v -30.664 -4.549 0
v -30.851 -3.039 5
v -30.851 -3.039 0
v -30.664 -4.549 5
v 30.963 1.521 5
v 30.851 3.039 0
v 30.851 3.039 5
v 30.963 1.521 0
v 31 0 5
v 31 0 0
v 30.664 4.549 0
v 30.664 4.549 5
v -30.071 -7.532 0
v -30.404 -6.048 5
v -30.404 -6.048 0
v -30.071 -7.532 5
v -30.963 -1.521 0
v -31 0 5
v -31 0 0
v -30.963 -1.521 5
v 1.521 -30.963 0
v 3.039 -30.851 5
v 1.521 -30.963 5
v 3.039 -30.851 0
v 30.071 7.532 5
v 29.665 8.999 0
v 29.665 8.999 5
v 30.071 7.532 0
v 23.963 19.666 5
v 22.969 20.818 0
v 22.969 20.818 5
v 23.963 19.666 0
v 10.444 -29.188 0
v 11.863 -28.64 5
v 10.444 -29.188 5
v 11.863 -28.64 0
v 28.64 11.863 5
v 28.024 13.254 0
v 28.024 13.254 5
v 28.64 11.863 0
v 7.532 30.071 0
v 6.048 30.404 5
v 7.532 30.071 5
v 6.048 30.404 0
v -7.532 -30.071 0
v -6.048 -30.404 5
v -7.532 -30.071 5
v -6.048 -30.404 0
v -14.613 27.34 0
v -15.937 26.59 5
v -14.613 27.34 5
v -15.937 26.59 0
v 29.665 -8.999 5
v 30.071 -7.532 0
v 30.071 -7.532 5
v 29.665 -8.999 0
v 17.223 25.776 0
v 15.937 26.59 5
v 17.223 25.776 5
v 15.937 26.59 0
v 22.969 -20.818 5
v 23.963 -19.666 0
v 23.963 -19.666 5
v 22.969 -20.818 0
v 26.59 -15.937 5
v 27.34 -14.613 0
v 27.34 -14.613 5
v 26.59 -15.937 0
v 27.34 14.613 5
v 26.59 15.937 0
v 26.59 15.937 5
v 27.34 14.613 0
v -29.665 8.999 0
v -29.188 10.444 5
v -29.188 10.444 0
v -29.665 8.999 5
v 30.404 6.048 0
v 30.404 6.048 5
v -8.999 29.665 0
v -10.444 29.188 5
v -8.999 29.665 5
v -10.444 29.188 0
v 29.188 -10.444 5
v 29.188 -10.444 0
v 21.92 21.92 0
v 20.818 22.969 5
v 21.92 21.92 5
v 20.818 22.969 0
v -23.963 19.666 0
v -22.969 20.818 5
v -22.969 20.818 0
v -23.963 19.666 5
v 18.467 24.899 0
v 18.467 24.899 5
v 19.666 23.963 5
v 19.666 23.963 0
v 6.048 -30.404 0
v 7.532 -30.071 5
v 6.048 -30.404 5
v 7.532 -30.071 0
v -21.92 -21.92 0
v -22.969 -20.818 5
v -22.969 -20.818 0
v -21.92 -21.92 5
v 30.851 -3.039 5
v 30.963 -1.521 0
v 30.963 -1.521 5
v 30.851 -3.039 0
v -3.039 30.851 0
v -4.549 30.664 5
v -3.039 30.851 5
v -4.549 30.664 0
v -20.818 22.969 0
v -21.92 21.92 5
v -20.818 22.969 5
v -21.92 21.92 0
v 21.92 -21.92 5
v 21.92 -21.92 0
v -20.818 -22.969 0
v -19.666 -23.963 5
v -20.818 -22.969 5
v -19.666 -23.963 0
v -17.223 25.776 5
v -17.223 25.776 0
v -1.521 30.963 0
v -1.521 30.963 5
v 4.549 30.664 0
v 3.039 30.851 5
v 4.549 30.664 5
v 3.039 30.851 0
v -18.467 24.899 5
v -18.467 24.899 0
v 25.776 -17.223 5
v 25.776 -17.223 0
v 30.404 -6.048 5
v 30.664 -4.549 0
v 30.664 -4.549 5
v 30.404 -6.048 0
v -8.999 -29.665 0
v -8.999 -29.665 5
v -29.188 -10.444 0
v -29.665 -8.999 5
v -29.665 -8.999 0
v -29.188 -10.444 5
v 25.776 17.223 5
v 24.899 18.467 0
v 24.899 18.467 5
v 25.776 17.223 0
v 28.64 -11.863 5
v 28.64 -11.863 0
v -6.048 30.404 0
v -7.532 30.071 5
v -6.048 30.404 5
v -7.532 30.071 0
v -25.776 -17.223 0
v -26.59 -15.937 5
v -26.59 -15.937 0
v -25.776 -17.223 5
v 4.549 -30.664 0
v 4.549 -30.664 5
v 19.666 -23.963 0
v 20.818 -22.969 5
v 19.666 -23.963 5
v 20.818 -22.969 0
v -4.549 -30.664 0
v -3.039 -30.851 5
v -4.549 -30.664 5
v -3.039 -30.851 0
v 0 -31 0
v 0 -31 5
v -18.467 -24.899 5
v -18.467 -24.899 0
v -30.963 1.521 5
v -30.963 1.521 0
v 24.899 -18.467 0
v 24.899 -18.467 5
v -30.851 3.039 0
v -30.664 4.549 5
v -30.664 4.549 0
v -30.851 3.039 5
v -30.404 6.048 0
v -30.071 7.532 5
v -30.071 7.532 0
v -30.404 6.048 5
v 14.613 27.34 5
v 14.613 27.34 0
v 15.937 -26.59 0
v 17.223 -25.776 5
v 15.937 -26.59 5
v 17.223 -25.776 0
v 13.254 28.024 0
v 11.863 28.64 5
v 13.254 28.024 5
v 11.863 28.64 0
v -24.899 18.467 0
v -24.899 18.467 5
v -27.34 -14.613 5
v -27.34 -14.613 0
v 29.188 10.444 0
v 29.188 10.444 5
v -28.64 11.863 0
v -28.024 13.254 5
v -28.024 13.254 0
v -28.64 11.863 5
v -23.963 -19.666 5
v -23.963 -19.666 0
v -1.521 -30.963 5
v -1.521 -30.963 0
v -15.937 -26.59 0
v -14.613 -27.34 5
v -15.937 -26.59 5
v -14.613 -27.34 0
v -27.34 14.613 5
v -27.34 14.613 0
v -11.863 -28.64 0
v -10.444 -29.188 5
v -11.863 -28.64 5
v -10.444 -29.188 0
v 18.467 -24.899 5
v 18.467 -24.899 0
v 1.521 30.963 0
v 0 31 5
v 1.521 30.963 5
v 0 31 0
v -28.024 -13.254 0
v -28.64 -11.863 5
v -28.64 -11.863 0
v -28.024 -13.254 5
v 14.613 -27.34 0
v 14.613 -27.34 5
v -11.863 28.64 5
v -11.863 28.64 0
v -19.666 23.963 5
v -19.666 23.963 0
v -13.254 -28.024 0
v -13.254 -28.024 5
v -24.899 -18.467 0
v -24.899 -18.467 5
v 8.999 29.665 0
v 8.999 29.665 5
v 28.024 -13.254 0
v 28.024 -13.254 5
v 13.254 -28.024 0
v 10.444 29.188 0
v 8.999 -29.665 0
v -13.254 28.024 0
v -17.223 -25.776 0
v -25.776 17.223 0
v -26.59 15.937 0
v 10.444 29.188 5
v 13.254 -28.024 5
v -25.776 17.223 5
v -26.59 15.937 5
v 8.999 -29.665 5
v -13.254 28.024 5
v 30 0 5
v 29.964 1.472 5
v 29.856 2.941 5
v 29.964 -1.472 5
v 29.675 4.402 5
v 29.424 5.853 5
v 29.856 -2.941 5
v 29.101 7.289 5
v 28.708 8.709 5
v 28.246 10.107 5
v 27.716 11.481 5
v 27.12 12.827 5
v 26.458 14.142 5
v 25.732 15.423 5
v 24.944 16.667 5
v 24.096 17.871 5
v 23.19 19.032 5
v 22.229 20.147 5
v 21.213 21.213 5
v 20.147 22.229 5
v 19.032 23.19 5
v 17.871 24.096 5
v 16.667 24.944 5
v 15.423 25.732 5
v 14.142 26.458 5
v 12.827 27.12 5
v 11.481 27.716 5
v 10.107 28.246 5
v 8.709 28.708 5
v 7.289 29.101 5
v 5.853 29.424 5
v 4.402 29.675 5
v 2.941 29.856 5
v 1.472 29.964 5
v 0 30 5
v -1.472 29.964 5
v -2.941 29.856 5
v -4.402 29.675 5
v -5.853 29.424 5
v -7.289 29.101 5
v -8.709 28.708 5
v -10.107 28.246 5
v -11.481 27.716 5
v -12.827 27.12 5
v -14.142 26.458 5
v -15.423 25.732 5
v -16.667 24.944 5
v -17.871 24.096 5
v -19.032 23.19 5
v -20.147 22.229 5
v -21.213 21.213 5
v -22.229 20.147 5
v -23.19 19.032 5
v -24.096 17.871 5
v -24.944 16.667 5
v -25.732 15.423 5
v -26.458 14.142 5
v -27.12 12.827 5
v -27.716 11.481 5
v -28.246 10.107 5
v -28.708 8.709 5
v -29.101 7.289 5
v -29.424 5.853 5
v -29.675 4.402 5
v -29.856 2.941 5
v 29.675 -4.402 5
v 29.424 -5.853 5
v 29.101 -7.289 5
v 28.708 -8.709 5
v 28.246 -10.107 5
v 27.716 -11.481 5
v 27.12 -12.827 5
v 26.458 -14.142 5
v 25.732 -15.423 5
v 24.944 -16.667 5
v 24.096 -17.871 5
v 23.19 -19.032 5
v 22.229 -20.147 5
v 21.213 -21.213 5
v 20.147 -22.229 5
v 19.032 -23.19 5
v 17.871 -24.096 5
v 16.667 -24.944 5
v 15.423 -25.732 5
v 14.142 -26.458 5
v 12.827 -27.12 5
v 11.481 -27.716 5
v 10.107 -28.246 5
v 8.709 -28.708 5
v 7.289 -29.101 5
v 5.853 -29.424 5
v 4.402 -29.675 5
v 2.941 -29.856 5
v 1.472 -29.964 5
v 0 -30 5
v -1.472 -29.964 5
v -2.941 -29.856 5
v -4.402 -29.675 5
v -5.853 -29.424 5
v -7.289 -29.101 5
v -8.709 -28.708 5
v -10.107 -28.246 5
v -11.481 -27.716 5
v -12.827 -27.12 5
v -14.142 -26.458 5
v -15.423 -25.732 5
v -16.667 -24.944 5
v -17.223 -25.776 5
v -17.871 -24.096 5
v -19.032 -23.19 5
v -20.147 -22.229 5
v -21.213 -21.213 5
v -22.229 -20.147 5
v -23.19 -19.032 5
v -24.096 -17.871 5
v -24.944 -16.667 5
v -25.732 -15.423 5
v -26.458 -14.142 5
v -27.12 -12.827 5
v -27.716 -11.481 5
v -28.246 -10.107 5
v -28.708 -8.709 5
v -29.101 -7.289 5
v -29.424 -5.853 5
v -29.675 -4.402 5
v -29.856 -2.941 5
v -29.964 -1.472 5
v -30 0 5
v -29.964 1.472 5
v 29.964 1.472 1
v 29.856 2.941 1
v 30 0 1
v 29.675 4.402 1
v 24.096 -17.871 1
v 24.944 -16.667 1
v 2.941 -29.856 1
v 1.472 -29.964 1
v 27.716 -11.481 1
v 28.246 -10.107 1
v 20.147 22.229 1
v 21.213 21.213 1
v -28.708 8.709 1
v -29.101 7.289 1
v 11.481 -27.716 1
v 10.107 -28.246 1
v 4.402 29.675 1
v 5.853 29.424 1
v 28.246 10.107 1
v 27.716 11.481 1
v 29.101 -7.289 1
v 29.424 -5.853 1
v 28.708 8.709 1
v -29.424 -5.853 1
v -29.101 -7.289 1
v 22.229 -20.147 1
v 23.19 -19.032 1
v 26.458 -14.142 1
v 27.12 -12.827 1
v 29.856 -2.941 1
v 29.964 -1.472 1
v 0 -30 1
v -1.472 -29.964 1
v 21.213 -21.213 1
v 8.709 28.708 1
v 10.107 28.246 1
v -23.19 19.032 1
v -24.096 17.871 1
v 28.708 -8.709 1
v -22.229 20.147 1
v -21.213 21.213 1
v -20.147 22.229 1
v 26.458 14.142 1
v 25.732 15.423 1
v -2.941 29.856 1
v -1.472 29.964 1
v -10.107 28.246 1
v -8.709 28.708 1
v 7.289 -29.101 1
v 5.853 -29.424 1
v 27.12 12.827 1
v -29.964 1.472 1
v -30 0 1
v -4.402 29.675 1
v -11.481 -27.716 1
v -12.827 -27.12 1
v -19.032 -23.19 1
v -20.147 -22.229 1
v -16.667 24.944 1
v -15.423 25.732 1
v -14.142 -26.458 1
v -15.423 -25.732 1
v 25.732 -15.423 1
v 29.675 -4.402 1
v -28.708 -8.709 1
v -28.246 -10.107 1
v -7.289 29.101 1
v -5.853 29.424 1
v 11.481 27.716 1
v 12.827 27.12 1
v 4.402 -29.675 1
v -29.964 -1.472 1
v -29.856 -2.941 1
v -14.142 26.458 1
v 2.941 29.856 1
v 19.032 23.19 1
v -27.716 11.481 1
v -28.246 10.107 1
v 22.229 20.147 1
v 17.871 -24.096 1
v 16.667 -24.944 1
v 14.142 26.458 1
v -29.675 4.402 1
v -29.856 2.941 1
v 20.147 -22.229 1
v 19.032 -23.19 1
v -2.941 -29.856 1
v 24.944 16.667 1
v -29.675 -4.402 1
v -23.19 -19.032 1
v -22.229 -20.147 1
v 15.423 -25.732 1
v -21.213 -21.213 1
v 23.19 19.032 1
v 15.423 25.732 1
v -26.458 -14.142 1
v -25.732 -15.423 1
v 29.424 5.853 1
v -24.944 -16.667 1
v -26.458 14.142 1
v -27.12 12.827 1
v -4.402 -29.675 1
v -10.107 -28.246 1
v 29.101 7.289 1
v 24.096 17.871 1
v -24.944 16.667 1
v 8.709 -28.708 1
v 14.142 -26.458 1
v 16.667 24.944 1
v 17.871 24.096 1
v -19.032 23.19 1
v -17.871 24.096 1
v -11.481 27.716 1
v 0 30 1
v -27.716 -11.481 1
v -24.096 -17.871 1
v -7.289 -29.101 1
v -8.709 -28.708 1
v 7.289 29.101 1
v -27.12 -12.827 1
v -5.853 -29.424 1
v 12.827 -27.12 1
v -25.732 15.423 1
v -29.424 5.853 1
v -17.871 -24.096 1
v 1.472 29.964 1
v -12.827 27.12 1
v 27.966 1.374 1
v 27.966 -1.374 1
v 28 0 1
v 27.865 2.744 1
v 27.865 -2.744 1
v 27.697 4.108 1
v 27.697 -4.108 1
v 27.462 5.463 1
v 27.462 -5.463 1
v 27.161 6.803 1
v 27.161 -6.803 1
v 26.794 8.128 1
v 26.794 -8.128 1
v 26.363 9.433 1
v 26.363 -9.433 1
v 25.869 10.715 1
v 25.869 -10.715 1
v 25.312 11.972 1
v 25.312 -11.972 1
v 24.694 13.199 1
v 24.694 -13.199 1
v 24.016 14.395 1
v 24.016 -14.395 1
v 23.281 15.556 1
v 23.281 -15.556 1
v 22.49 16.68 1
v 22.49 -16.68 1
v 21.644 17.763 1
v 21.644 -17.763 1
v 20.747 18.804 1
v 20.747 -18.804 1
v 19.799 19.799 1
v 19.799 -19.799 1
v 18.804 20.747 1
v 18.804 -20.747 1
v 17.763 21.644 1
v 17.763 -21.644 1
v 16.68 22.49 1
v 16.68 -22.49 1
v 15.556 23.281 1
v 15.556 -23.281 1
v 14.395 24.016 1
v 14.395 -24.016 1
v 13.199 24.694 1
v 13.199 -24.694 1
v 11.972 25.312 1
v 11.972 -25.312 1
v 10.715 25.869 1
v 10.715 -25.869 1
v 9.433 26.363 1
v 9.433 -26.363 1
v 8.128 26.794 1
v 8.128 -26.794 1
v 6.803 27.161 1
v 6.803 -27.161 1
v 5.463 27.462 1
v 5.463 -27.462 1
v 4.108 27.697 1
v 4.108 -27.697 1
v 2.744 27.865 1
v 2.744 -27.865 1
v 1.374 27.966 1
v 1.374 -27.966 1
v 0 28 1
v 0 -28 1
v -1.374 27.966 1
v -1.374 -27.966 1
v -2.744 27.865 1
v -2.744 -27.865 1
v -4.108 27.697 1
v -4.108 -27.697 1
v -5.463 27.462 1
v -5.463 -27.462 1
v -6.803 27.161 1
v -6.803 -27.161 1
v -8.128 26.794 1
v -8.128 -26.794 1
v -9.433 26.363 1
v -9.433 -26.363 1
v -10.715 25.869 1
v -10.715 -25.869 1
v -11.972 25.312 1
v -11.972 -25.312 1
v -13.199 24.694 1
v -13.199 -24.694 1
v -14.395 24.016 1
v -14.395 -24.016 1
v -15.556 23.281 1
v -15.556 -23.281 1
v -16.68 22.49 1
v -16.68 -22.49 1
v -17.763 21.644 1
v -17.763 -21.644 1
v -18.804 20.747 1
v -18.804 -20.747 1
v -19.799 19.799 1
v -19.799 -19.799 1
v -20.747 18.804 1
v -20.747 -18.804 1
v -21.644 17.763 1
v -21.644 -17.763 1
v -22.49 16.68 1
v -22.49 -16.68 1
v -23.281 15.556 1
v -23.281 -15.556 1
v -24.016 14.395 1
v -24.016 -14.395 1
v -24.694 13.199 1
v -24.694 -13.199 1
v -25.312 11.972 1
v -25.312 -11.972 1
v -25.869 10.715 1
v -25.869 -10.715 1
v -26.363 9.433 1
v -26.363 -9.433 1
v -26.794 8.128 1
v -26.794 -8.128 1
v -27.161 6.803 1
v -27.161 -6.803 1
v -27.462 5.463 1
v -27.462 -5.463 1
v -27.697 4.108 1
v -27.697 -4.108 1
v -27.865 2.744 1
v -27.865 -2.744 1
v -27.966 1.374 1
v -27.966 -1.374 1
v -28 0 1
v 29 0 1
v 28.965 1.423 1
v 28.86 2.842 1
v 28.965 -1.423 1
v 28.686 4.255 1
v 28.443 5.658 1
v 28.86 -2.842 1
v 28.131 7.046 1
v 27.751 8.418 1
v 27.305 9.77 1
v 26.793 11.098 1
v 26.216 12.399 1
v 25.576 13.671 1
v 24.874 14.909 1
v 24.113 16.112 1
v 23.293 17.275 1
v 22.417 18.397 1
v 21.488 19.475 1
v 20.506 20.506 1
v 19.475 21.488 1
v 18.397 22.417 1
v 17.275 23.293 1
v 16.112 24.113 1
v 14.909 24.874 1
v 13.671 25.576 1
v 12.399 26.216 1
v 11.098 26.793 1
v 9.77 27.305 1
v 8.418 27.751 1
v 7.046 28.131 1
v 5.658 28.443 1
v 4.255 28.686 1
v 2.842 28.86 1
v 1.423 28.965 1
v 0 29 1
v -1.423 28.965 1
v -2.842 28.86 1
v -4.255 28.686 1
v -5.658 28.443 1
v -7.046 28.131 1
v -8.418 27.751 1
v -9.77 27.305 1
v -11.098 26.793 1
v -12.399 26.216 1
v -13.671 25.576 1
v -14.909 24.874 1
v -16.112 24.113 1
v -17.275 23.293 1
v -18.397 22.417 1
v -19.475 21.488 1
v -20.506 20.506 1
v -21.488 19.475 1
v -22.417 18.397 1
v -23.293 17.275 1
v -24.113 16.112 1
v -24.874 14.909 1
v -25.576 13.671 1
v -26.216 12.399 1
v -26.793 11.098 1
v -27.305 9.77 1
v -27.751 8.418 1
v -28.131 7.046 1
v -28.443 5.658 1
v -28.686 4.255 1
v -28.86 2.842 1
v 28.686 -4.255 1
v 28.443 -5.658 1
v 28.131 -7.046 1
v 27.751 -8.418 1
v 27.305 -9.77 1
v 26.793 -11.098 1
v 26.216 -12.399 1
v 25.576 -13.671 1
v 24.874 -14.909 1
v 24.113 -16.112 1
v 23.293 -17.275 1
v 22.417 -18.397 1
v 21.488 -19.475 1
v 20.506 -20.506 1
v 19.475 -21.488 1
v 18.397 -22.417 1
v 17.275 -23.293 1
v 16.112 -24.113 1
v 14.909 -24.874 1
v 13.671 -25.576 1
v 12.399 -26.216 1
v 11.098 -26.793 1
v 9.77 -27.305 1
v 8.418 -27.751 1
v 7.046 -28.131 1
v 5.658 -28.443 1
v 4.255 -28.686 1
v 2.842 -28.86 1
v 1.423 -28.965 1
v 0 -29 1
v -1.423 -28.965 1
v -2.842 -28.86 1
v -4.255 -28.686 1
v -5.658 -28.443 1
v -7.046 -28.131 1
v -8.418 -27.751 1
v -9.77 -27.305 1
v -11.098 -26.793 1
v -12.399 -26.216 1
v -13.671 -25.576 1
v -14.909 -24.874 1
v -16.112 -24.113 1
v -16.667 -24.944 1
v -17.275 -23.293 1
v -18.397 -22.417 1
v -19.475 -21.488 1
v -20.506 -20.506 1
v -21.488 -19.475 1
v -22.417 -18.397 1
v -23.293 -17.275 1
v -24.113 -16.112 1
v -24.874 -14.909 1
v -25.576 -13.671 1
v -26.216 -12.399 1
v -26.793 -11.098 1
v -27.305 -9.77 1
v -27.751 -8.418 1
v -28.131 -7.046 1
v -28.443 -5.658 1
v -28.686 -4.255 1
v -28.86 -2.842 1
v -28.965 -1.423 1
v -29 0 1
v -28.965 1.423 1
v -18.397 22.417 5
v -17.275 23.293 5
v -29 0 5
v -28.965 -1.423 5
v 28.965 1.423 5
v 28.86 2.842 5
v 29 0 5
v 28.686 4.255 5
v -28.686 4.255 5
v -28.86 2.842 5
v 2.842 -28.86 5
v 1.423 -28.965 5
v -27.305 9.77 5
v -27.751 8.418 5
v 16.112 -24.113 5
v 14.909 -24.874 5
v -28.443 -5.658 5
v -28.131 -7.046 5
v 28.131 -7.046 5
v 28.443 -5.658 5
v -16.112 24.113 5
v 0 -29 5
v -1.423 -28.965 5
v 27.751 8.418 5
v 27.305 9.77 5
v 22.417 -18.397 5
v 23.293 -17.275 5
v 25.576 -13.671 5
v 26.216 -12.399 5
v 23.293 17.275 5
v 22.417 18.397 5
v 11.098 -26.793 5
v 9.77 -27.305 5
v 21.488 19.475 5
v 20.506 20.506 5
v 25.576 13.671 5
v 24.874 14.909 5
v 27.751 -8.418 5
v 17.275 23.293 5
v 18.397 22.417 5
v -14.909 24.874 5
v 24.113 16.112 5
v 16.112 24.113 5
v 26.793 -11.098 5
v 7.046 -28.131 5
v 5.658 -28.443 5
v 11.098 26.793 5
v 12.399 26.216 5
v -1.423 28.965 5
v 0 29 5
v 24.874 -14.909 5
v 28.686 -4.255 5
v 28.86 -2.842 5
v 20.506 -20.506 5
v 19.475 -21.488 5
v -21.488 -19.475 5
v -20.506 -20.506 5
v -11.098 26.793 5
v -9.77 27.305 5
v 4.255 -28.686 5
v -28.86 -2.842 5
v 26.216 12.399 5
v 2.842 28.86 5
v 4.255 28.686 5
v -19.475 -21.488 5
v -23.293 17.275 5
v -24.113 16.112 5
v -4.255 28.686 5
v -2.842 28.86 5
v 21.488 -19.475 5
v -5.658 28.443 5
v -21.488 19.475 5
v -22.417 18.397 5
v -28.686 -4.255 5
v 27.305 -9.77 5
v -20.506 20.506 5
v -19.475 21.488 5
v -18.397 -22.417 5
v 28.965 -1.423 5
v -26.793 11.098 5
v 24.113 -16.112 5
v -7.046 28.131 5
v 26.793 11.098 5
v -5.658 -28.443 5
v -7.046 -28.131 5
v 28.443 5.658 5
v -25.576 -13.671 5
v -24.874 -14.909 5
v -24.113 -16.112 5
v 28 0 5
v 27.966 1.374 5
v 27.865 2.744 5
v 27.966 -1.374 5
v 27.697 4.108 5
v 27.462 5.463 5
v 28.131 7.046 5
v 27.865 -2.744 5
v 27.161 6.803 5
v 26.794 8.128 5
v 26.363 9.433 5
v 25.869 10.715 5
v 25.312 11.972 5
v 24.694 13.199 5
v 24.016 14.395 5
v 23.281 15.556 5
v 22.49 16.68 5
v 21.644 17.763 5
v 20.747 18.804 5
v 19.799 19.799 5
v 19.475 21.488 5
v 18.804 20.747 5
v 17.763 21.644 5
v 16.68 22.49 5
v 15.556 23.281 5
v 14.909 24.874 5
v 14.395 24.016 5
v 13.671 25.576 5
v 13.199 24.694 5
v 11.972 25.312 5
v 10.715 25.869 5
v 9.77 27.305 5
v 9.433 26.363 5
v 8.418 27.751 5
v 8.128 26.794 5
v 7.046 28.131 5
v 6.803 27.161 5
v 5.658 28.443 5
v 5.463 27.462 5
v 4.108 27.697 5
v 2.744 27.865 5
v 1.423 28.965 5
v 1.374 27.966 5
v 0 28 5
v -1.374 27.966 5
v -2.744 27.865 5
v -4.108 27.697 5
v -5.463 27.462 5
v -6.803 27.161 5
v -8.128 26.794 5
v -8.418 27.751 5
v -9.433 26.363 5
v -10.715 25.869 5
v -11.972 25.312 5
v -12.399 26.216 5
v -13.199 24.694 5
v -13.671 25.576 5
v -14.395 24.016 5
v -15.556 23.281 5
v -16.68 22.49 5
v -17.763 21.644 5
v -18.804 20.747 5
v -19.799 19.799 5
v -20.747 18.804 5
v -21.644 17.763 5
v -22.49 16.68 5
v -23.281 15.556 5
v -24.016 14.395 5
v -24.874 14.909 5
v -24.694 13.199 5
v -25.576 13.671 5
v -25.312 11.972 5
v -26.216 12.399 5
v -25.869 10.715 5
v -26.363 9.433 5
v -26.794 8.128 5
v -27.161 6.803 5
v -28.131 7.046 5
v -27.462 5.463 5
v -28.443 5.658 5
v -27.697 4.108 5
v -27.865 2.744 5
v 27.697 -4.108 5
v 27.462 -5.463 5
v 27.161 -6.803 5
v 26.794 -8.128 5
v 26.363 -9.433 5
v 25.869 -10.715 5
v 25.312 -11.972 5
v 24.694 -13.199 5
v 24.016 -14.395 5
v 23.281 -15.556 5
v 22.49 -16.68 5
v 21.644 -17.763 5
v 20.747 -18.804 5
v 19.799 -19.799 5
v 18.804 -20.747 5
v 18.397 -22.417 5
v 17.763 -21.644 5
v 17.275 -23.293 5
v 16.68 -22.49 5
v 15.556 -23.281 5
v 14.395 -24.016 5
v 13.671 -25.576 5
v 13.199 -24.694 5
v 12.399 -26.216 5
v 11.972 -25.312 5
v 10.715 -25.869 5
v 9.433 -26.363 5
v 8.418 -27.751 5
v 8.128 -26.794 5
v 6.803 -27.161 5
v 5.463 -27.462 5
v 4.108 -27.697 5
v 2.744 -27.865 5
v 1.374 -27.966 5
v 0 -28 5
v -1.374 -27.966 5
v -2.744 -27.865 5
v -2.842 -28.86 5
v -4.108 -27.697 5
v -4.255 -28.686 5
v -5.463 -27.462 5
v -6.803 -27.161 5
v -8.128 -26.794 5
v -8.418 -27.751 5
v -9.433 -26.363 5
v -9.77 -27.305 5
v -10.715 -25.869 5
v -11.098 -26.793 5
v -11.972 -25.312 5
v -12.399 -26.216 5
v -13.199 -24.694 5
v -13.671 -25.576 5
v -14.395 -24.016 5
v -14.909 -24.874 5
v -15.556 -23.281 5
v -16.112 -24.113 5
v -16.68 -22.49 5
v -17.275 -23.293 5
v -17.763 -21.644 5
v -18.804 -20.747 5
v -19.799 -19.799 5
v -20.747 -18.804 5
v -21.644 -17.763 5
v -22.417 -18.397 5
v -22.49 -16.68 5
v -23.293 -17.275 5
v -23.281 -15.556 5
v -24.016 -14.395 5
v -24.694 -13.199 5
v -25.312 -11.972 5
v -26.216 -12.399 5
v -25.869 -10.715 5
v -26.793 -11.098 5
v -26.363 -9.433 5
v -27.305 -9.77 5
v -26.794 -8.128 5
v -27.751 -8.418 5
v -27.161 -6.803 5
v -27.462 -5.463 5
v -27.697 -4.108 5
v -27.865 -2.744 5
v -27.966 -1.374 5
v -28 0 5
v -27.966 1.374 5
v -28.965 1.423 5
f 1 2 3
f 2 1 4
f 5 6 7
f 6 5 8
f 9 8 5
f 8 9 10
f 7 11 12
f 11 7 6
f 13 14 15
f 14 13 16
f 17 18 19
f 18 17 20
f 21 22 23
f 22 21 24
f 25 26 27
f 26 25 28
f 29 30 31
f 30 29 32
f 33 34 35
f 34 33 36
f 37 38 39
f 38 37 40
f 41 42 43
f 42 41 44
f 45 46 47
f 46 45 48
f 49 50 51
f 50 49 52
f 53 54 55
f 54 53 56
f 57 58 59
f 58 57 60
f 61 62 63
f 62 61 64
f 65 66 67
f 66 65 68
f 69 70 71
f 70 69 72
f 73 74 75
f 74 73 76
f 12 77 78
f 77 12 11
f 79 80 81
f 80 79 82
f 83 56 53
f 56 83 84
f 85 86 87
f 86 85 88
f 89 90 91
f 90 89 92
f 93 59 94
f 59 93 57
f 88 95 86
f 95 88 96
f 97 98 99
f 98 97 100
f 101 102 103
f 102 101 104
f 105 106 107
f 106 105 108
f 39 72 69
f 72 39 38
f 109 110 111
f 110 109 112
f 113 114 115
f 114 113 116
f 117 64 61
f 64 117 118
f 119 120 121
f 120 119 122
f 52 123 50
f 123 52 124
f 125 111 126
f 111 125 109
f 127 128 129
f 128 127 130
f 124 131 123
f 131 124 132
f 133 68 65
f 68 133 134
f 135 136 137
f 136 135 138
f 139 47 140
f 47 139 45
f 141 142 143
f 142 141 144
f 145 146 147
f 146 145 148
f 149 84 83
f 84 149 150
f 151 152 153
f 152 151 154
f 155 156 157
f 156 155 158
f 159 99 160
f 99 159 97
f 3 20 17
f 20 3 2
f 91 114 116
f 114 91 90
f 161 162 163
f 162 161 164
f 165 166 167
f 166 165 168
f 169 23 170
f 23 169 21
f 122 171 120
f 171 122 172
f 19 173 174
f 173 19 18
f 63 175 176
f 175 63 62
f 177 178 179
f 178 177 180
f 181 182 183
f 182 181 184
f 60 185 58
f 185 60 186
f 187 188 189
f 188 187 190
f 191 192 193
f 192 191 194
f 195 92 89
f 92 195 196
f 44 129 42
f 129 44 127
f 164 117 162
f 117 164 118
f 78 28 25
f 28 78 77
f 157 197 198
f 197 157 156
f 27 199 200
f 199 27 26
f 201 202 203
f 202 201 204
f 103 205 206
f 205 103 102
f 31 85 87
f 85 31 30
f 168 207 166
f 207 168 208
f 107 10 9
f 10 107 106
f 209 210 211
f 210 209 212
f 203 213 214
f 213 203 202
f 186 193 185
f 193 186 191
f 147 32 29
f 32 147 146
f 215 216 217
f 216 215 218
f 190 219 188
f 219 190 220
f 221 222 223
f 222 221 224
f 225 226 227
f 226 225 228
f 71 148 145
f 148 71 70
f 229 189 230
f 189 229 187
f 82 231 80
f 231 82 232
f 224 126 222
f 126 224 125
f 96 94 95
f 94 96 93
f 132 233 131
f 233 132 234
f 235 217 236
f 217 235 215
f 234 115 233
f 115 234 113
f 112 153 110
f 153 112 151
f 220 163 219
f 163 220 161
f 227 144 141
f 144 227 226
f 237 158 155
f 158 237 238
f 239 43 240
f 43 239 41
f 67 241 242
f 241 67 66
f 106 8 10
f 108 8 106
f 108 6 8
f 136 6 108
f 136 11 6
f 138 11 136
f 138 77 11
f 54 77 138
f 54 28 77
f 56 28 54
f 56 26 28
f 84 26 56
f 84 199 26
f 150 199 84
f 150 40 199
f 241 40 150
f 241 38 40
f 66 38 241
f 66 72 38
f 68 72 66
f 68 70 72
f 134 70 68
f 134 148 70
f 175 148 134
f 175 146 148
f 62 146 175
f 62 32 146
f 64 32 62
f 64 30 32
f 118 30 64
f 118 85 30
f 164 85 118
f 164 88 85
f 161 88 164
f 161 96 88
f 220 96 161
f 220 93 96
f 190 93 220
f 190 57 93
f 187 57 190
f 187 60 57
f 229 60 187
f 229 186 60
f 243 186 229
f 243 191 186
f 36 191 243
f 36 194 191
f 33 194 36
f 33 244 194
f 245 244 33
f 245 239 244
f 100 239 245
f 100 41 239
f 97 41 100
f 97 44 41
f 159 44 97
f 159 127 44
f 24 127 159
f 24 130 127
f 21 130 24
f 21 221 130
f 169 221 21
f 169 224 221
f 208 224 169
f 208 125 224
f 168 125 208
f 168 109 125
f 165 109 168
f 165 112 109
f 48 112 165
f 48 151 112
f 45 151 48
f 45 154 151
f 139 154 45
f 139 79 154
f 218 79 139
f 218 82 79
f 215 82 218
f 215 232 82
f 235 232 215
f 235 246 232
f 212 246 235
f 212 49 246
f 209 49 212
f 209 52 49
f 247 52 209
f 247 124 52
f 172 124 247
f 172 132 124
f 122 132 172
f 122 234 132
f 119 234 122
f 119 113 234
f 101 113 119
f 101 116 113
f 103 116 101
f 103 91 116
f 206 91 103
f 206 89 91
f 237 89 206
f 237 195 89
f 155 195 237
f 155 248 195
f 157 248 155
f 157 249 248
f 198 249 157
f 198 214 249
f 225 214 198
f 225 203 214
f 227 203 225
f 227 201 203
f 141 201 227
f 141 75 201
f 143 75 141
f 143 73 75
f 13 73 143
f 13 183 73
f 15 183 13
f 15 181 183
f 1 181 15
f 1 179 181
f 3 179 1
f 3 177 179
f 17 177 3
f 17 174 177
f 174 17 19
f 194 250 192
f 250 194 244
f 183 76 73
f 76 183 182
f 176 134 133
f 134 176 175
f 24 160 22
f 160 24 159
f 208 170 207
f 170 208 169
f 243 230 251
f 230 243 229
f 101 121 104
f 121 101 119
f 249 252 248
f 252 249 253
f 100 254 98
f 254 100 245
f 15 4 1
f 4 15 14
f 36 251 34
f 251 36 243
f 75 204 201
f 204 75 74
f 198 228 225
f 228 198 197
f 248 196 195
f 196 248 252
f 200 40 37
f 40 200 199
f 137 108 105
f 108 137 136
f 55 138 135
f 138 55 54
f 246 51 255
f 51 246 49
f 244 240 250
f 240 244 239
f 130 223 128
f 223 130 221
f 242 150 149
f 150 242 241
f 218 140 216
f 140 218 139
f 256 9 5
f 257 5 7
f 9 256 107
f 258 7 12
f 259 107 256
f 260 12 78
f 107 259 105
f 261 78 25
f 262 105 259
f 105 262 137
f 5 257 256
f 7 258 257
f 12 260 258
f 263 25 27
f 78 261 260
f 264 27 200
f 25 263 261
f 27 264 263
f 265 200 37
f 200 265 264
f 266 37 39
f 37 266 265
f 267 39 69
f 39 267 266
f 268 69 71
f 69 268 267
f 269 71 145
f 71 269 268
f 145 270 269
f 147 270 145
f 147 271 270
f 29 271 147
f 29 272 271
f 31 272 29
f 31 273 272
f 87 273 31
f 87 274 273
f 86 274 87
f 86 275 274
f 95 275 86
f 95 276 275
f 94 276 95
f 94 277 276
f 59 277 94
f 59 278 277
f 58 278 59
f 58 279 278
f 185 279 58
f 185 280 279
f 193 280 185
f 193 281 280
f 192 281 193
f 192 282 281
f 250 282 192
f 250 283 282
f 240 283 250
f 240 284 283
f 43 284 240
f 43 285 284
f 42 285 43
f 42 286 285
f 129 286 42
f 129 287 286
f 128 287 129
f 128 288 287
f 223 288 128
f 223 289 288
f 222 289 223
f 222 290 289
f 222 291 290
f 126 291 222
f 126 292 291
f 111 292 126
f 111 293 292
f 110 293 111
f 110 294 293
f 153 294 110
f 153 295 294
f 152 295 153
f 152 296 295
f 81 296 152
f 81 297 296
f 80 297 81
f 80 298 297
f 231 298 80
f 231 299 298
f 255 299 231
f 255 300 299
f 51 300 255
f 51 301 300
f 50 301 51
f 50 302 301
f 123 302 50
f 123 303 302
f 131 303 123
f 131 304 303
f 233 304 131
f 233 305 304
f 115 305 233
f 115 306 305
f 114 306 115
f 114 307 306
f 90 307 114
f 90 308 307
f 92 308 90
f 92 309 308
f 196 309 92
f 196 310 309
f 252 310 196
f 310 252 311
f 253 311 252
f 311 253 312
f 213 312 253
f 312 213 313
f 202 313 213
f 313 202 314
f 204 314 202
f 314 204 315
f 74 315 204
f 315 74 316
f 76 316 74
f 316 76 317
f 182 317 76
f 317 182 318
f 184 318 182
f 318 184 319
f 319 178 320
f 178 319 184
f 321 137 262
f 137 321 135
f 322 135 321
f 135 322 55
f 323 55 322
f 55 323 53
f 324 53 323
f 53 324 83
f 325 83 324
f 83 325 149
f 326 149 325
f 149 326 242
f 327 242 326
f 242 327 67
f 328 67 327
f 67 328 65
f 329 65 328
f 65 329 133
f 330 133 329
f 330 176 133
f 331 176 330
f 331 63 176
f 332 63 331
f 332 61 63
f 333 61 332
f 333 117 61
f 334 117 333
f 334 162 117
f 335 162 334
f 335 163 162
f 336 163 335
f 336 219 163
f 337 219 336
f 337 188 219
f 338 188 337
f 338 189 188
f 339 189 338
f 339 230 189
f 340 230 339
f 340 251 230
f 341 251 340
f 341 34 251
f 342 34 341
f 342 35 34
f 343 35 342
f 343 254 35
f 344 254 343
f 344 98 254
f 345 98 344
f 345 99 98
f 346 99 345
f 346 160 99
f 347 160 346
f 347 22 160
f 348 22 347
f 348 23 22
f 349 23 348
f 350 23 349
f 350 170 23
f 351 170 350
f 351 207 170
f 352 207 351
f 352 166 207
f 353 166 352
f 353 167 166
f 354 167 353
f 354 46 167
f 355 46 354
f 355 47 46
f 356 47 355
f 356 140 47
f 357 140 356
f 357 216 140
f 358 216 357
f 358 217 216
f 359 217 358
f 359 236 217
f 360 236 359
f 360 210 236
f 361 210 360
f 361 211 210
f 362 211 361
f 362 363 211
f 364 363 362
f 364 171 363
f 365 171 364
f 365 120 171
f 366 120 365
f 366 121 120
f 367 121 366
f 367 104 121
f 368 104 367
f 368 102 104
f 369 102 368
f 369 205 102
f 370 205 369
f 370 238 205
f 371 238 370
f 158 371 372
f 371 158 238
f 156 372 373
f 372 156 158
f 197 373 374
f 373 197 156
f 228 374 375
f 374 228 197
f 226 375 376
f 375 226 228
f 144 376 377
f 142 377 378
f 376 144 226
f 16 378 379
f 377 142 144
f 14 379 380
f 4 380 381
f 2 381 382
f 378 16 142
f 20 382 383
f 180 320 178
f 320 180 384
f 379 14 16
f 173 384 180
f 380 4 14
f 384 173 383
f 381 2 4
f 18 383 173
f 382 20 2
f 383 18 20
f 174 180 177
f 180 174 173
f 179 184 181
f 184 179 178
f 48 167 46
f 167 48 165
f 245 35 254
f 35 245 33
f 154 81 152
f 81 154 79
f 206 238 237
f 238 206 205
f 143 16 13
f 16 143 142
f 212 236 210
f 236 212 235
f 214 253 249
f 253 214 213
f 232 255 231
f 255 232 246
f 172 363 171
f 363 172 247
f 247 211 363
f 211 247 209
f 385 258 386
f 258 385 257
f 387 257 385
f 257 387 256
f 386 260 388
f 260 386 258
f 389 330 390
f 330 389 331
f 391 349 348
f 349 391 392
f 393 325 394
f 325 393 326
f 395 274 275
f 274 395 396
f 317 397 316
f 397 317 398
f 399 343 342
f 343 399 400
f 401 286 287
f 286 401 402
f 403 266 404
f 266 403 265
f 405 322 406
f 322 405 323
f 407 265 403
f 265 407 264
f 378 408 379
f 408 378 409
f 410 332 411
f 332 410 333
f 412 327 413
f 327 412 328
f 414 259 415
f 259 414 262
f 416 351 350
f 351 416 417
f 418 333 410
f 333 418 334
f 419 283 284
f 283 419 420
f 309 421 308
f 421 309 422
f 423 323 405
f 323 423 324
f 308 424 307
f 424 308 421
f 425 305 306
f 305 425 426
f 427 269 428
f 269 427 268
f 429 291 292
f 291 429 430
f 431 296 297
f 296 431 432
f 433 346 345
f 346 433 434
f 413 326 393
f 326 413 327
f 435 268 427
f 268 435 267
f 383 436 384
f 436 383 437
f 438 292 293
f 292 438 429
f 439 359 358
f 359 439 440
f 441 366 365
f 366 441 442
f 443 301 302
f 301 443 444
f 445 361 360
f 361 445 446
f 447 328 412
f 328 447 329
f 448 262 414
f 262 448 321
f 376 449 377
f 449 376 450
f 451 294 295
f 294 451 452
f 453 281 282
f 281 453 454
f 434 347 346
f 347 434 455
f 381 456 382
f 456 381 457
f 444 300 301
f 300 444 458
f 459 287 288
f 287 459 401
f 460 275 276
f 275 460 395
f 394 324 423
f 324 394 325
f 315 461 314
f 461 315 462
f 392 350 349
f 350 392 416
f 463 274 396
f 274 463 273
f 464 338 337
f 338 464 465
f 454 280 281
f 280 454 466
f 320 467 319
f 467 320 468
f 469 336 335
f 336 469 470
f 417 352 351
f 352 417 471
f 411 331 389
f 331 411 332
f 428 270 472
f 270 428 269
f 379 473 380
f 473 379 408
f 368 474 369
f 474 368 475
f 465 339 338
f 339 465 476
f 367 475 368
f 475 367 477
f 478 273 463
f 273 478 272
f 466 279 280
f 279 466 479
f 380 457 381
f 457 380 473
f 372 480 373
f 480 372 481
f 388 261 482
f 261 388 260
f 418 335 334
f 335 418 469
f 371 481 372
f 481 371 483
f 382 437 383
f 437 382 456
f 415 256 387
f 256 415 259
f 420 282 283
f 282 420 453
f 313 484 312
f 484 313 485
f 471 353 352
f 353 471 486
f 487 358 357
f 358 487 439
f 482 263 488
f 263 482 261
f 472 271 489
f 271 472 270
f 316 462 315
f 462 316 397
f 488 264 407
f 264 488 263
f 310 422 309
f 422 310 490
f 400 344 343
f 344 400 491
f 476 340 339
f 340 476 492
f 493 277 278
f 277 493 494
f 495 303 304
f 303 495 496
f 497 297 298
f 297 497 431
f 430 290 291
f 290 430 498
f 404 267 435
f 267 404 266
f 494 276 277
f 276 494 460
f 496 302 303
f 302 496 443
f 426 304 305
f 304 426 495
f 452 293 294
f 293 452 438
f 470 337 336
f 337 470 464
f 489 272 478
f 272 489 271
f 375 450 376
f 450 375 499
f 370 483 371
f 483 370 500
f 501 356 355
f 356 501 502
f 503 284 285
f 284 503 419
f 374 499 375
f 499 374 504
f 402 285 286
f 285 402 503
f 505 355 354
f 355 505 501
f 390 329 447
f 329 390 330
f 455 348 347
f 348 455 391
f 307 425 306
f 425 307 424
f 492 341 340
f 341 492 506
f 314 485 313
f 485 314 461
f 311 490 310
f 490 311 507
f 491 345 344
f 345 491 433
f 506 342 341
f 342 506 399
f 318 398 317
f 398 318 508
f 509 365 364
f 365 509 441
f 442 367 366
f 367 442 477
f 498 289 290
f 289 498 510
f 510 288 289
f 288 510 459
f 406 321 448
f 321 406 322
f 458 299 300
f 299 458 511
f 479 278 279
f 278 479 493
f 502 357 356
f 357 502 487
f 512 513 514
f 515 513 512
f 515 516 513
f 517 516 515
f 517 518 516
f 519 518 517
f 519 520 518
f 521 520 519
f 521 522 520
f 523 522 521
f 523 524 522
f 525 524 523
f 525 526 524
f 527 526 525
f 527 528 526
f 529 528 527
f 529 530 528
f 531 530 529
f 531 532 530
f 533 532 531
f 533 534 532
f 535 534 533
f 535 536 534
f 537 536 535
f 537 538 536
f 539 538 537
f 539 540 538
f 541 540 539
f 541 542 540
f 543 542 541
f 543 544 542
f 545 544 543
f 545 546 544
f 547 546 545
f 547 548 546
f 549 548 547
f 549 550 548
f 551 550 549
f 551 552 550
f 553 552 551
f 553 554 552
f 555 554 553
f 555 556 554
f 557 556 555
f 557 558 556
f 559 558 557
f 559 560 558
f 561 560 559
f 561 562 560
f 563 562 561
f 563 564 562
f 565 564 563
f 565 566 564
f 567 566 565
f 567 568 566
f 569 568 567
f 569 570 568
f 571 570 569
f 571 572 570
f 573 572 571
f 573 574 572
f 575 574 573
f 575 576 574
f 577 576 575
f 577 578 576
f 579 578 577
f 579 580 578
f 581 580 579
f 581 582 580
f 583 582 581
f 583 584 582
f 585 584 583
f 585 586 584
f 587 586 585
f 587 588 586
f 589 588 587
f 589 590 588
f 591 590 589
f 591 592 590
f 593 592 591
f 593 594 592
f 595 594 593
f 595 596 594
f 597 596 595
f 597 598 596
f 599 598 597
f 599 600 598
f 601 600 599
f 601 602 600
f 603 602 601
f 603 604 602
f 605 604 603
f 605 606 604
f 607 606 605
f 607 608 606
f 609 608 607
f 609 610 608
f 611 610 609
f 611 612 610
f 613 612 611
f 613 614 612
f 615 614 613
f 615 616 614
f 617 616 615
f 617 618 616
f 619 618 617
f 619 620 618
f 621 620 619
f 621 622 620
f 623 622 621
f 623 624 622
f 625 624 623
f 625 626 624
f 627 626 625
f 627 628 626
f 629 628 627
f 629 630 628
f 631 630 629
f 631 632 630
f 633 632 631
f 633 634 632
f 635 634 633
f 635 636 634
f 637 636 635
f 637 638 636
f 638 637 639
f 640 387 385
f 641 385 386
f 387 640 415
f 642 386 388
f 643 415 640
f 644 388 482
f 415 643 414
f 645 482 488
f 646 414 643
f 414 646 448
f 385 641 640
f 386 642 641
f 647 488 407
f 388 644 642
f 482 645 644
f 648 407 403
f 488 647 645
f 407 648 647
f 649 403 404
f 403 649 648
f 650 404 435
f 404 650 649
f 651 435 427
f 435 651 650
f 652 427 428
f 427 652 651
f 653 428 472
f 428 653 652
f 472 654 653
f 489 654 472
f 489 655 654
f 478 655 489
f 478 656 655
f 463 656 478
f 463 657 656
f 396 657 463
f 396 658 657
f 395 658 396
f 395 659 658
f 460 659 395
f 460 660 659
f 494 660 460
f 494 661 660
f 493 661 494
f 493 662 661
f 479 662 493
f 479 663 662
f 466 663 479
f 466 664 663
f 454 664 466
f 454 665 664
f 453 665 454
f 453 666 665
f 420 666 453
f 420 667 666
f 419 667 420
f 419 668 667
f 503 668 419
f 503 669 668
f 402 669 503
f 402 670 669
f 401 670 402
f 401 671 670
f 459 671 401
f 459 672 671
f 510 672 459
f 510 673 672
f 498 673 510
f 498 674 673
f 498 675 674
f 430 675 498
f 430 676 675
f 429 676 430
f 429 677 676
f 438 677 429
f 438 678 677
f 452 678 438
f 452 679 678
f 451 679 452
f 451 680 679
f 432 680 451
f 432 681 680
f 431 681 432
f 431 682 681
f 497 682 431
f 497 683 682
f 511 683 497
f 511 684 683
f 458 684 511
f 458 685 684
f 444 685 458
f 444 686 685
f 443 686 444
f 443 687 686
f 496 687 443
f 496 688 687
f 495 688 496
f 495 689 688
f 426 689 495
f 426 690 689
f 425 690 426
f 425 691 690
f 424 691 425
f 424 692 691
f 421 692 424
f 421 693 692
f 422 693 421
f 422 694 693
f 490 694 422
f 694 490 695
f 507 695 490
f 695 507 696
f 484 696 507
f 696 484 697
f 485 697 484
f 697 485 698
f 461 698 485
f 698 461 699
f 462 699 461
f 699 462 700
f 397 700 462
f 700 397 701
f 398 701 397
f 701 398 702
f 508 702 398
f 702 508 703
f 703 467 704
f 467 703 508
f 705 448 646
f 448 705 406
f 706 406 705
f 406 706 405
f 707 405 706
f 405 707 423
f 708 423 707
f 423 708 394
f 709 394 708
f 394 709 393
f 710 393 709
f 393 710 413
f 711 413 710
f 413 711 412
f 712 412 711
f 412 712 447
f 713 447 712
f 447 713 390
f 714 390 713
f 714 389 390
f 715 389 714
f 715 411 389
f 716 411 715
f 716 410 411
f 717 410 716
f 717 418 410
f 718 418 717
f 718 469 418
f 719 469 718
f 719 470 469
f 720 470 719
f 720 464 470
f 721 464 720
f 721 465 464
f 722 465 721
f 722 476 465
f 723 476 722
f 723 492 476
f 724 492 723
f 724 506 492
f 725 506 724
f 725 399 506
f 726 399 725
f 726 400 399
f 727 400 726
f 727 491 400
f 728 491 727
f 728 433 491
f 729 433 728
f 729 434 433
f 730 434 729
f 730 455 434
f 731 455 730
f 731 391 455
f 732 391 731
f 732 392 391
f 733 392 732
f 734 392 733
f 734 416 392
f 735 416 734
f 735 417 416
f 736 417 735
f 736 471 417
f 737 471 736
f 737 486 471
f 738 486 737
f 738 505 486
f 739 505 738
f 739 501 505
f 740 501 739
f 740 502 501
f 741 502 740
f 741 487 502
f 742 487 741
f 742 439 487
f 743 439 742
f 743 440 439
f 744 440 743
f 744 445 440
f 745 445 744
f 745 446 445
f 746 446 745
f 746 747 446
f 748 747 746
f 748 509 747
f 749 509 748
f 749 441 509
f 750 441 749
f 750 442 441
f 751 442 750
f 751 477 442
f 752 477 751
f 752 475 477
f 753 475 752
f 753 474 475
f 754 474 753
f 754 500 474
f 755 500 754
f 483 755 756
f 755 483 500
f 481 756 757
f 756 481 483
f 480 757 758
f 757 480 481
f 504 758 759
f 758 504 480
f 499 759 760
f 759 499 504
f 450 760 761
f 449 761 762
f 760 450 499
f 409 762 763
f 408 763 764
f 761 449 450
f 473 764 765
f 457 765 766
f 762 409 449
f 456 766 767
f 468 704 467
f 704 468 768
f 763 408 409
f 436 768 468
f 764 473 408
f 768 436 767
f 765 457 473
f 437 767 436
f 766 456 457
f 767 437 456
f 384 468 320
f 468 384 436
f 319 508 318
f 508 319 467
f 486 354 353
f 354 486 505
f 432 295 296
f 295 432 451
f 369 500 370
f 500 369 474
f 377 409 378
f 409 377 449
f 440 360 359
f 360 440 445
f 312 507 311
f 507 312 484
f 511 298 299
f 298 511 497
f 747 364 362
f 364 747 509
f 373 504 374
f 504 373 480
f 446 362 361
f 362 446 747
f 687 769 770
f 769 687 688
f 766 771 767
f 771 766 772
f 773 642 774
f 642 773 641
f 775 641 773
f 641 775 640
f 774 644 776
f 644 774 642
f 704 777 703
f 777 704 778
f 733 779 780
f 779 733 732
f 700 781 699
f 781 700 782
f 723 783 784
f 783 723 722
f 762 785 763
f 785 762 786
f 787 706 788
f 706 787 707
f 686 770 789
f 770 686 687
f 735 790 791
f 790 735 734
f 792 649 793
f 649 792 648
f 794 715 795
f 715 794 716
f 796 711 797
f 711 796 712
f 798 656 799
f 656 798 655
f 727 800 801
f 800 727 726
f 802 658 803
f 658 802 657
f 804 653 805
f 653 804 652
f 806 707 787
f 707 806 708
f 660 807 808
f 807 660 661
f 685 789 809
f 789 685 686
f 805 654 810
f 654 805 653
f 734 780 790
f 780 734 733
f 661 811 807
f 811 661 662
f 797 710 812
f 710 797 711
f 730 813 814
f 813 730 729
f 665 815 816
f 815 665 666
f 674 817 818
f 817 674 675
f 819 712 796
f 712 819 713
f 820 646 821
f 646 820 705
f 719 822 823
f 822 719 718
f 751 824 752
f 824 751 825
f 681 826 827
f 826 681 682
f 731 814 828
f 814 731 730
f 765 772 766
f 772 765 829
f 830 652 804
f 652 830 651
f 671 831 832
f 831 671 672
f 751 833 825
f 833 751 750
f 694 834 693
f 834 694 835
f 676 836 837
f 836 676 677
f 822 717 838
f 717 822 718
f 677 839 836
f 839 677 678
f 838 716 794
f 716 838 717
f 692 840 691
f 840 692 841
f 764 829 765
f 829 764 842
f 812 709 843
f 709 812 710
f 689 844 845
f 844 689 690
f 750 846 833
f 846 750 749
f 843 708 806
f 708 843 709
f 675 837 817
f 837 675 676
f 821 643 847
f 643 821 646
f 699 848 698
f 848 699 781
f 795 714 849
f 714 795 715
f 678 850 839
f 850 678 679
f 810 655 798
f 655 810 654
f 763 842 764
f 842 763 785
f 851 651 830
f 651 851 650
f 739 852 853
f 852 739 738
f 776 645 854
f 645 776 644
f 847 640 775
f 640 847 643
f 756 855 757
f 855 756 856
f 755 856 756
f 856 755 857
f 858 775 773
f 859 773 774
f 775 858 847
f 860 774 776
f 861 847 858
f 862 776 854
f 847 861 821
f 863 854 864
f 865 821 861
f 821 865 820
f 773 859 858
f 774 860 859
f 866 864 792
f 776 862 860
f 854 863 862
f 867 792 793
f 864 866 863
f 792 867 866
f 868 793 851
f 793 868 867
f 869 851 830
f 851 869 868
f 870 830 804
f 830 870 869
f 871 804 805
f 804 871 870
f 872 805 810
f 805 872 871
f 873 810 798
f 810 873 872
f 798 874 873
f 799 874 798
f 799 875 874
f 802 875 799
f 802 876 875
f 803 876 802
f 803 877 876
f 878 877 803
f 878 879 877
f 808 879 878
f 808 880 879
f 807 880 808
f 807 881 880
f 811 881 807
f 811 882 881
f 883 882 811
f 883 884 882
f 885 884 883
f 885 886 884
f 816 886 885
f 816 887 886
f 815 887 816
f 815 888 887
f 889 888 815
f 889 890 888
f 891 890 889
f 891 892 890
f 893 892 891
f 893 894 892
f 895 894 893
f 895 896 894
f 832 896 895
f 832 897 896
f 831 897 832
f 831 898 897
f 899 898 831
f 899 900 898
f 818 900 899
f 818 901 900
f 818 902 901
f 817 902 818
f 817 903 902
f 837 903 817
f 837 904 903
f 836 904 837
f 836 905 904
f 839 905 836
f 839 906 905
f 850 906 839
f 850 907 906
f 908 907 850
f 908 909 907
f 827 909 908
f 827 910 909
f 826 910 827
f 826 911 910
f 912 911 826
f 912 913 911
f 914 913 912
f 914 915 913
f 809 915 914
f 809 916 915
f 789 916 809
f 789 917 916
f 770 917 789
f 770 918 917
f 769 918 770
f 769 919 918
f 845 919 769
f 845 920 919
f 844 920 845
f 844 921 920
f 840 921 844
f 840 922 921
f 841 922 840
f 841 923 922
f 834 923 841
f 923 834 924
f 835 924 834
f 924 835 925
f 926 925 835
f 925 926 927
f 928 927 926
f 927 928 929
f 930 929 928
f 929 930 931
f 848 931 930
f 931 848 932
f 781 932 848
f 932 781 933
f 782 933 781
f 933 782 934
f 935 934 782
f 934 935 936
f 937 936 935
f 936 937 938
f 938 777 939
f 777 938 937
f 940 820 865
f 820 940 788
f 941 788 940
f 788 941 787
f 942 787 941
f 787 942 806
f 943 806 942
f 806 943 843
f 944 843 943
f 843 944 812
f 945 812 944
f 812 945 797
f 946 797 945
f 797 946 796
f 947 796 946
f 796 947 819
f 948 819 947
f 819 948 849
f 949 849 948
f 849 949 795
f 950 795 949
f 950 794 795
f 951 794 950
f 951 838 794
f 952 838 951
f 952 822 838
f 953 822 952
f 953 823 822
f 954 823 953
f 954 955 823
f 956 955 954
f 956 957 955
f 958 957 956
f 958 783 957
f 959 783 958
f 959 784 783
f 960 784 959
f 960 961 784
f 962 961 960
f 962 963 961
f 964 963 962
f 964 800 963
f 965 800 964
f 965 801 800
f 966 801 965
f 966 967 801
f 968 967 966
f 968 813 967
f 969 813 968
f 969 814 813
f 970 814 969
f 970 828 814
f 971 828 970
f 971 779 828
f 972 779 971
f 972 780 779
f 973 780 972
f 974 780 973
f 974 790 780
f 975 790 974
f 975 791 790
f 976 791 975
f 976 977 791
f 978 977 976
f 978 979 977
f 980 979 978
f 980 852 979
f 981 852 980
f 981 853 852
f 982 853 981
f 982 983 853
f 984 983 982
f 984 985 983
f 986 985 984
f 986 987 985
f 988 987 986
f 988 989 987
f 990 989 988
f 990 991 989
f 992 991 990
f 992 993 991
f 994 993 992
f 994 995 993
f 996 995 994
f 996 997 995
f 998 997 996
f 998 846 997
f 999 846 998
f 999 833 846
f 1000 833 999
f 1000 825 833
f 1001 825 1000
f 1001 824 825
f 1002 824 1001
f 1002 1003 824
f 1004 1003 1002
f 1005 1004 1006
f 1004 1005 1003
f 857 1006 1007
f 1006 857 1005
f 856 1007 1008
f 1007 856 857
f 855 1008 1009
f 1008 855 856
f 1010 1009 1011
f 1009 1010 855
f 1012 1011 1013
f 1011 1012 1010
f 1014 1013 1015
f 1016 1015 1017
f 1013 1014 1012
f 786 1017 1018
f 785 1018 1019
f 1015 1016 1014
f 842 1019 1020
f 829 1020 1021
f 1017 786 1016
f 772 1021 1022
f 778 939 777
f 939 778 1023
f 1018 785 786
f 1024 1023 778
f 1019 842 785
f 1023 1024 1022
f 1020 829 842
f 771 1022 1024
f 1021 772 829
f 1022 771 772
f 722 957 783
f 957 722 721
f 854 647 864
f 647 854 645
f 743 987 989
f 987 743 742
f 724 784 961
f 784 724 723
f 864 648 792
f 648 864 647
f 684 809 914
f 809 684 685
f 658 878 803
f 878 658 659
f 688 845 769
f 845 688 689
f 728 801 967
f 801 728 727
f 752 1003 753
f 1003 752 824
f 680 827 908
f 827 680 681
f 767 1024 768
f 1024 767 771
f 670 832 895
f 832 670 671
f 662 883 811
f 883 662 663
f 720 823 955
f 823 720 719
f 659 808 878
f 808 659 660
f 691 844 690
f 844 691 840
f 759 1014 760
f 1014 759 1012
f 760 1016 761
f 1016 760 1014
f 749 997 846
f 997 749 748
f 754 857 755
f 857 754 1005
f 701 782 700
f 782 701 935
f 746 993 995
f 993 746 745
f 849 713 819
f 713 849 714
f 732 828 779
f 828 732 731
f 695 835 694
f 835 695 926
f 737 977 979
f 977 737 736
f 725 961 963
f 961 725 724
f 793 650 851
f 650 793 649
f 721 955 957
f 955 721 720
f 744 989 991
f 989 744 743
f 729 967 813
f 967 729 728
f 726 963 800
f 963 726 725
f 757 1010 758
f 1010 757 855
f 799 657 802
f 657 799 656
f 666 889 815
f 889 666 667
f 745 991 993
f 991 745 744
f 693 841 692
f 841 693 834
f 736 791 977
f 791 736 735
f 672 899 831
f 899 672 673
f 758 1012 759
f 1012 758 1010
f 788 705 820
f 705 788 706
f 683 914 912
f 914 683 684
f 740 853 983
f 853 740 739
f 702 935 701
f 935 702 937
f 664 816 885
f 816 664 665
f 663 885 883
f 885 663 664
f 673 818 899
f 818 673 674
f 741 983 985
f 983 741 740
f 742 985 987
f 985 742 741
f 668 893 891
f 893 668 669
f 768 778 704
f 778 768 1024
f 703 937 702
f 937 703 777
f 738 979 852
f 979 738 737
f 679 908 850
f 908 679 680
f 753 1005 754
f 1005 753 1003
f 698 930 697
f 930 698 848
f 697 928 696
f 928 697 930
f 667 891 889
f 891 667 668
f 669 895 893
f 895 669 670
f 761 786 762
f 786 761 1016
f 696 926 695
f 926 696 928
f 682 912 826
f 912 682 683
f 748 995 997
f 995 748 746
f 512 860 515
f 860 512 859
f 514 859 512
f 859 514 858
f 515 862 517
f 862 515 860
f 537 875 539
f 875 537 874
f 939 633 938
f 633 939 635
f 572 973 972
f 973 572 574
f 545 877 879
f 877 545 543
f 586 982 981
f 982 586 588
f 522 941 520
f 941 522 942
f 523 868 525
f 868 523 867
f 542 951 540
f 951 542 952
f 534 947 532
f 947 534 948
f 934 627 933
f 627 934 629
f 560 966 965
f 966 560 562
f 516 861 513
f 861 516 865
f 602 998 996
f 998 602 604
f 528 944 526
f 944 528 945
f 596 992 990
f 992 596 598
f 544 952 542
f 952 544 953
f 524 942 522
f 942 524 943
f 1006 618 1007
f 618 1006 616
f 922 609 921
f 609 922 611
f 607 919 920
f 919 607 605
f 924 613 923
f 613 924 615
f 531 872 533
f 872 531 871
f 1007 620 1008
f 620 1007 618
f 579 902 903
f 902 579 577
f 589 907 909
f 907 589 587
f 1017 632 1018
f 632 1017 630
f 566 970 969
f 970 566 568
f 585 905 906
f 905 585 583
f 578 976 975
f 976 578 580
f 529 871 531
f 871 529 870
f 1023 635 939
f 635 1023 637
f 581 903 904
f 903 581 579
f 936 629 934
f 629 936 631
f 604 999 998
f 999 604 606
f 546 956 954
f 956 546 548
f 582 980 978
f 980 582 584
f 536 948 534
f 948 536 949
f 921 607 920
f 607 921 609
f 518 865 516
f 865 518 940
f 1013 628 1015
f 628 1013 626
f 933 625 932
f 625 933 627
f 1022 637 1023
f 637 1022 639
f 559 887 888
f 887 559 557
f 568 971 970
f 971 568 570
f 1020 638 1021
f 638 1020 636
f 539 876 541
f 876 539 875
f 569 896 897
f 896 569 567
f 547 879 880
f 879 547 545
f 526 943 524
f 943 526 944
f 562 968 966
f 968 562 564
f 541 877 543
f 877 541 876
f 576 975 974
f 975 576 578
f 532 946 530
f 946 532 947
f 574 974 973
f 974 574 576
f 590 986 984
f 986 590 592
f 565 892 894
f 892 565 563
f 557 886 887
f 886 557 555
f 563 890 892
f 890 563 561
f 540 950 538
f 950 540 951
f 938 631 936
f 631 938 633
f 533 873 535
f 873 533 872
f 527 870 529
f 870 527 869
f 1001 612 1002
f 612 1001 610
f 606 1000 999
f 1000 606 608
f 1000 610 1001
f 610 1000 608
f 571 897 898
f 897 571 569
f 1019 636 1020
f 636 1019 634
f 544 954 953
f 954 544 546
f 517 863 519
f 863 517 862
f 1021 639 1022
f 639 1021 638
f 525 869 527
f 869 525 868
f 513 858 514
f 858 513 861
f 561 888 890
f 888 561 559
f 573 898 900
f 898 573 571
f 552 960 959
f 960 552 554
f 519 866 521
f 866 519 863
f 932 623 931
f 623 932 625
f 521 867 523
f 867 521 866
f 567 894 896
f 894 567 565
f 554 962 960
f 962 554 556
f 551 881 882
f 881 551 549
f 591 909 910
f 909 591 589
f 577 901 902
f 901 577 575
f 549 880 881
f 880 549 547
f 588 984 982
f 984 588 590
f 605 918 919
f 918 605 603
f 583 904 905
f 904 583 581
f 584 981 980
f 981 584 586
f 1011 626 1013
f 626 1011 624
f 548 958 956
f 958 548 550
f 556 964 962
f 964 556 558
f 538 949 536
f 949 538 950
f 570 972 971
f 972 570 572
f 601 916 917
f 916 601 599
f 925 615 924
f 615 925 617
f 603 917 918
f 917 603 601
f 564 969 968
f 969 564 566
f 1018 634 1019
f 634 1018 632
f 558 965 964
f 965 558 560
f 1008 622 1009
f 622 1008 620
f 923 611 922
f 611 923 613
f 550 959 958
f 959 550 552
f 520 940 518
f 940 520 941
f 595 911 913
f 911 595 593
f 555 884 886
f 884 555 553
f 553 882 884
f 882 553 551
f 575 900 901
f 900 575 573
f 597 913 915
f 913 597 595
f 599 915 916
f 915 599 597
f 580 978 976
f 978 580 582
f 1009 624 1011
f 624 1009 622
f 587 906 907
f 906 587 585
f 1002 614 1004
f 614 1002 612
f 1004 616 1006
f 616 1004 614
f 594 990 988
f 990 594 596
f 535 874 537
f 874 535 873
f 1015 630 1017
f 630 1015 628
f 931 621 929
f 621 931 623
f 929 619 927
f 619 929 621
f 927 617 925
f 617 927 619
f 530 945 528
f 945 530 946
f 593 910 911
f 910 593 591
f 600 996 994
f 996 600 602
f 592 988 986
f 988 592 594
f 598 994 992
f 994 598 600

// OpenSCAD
// ------------------ Parameters ------------------
outer_radius = 31;          // mm
wall_thickness = 1;         // mm
height = 5;                // mm

bottom_thickness = 1;       // mm (solid bottom)
top_clearance = 4;          // mm (no bars at top)

// smooth corners
$fn = 128;

module hollow_cylinder() {
    union() {
        difference() {
            // Outer shell
            cylinder(r = outer_radius, h = height);

            // Inner hollow (raised to leave solid bottom)
            translate([0, 0, bottom_thickness])
                cylinder(
                    r = outer_radius - wall_thickness,
                    h = height - bottom_thickness
                );
        }
        
        difference() {
            // Outer shell
            translate([0, 0, bottom_thickness])
                cylinder(r = outer_radius - 2*wall_thickness, h = height - bottom_thickness);

            // Inner hollow (raised to leave solid bottom)
            translate([0, 0, bottom_thickness])
                cylinder(
                    r = outer_radius - 2*wall_thickness - wall_thickness,
                    h = height - bottom_thickness
                );
        }      
    }
}

hollow_cylinder();
